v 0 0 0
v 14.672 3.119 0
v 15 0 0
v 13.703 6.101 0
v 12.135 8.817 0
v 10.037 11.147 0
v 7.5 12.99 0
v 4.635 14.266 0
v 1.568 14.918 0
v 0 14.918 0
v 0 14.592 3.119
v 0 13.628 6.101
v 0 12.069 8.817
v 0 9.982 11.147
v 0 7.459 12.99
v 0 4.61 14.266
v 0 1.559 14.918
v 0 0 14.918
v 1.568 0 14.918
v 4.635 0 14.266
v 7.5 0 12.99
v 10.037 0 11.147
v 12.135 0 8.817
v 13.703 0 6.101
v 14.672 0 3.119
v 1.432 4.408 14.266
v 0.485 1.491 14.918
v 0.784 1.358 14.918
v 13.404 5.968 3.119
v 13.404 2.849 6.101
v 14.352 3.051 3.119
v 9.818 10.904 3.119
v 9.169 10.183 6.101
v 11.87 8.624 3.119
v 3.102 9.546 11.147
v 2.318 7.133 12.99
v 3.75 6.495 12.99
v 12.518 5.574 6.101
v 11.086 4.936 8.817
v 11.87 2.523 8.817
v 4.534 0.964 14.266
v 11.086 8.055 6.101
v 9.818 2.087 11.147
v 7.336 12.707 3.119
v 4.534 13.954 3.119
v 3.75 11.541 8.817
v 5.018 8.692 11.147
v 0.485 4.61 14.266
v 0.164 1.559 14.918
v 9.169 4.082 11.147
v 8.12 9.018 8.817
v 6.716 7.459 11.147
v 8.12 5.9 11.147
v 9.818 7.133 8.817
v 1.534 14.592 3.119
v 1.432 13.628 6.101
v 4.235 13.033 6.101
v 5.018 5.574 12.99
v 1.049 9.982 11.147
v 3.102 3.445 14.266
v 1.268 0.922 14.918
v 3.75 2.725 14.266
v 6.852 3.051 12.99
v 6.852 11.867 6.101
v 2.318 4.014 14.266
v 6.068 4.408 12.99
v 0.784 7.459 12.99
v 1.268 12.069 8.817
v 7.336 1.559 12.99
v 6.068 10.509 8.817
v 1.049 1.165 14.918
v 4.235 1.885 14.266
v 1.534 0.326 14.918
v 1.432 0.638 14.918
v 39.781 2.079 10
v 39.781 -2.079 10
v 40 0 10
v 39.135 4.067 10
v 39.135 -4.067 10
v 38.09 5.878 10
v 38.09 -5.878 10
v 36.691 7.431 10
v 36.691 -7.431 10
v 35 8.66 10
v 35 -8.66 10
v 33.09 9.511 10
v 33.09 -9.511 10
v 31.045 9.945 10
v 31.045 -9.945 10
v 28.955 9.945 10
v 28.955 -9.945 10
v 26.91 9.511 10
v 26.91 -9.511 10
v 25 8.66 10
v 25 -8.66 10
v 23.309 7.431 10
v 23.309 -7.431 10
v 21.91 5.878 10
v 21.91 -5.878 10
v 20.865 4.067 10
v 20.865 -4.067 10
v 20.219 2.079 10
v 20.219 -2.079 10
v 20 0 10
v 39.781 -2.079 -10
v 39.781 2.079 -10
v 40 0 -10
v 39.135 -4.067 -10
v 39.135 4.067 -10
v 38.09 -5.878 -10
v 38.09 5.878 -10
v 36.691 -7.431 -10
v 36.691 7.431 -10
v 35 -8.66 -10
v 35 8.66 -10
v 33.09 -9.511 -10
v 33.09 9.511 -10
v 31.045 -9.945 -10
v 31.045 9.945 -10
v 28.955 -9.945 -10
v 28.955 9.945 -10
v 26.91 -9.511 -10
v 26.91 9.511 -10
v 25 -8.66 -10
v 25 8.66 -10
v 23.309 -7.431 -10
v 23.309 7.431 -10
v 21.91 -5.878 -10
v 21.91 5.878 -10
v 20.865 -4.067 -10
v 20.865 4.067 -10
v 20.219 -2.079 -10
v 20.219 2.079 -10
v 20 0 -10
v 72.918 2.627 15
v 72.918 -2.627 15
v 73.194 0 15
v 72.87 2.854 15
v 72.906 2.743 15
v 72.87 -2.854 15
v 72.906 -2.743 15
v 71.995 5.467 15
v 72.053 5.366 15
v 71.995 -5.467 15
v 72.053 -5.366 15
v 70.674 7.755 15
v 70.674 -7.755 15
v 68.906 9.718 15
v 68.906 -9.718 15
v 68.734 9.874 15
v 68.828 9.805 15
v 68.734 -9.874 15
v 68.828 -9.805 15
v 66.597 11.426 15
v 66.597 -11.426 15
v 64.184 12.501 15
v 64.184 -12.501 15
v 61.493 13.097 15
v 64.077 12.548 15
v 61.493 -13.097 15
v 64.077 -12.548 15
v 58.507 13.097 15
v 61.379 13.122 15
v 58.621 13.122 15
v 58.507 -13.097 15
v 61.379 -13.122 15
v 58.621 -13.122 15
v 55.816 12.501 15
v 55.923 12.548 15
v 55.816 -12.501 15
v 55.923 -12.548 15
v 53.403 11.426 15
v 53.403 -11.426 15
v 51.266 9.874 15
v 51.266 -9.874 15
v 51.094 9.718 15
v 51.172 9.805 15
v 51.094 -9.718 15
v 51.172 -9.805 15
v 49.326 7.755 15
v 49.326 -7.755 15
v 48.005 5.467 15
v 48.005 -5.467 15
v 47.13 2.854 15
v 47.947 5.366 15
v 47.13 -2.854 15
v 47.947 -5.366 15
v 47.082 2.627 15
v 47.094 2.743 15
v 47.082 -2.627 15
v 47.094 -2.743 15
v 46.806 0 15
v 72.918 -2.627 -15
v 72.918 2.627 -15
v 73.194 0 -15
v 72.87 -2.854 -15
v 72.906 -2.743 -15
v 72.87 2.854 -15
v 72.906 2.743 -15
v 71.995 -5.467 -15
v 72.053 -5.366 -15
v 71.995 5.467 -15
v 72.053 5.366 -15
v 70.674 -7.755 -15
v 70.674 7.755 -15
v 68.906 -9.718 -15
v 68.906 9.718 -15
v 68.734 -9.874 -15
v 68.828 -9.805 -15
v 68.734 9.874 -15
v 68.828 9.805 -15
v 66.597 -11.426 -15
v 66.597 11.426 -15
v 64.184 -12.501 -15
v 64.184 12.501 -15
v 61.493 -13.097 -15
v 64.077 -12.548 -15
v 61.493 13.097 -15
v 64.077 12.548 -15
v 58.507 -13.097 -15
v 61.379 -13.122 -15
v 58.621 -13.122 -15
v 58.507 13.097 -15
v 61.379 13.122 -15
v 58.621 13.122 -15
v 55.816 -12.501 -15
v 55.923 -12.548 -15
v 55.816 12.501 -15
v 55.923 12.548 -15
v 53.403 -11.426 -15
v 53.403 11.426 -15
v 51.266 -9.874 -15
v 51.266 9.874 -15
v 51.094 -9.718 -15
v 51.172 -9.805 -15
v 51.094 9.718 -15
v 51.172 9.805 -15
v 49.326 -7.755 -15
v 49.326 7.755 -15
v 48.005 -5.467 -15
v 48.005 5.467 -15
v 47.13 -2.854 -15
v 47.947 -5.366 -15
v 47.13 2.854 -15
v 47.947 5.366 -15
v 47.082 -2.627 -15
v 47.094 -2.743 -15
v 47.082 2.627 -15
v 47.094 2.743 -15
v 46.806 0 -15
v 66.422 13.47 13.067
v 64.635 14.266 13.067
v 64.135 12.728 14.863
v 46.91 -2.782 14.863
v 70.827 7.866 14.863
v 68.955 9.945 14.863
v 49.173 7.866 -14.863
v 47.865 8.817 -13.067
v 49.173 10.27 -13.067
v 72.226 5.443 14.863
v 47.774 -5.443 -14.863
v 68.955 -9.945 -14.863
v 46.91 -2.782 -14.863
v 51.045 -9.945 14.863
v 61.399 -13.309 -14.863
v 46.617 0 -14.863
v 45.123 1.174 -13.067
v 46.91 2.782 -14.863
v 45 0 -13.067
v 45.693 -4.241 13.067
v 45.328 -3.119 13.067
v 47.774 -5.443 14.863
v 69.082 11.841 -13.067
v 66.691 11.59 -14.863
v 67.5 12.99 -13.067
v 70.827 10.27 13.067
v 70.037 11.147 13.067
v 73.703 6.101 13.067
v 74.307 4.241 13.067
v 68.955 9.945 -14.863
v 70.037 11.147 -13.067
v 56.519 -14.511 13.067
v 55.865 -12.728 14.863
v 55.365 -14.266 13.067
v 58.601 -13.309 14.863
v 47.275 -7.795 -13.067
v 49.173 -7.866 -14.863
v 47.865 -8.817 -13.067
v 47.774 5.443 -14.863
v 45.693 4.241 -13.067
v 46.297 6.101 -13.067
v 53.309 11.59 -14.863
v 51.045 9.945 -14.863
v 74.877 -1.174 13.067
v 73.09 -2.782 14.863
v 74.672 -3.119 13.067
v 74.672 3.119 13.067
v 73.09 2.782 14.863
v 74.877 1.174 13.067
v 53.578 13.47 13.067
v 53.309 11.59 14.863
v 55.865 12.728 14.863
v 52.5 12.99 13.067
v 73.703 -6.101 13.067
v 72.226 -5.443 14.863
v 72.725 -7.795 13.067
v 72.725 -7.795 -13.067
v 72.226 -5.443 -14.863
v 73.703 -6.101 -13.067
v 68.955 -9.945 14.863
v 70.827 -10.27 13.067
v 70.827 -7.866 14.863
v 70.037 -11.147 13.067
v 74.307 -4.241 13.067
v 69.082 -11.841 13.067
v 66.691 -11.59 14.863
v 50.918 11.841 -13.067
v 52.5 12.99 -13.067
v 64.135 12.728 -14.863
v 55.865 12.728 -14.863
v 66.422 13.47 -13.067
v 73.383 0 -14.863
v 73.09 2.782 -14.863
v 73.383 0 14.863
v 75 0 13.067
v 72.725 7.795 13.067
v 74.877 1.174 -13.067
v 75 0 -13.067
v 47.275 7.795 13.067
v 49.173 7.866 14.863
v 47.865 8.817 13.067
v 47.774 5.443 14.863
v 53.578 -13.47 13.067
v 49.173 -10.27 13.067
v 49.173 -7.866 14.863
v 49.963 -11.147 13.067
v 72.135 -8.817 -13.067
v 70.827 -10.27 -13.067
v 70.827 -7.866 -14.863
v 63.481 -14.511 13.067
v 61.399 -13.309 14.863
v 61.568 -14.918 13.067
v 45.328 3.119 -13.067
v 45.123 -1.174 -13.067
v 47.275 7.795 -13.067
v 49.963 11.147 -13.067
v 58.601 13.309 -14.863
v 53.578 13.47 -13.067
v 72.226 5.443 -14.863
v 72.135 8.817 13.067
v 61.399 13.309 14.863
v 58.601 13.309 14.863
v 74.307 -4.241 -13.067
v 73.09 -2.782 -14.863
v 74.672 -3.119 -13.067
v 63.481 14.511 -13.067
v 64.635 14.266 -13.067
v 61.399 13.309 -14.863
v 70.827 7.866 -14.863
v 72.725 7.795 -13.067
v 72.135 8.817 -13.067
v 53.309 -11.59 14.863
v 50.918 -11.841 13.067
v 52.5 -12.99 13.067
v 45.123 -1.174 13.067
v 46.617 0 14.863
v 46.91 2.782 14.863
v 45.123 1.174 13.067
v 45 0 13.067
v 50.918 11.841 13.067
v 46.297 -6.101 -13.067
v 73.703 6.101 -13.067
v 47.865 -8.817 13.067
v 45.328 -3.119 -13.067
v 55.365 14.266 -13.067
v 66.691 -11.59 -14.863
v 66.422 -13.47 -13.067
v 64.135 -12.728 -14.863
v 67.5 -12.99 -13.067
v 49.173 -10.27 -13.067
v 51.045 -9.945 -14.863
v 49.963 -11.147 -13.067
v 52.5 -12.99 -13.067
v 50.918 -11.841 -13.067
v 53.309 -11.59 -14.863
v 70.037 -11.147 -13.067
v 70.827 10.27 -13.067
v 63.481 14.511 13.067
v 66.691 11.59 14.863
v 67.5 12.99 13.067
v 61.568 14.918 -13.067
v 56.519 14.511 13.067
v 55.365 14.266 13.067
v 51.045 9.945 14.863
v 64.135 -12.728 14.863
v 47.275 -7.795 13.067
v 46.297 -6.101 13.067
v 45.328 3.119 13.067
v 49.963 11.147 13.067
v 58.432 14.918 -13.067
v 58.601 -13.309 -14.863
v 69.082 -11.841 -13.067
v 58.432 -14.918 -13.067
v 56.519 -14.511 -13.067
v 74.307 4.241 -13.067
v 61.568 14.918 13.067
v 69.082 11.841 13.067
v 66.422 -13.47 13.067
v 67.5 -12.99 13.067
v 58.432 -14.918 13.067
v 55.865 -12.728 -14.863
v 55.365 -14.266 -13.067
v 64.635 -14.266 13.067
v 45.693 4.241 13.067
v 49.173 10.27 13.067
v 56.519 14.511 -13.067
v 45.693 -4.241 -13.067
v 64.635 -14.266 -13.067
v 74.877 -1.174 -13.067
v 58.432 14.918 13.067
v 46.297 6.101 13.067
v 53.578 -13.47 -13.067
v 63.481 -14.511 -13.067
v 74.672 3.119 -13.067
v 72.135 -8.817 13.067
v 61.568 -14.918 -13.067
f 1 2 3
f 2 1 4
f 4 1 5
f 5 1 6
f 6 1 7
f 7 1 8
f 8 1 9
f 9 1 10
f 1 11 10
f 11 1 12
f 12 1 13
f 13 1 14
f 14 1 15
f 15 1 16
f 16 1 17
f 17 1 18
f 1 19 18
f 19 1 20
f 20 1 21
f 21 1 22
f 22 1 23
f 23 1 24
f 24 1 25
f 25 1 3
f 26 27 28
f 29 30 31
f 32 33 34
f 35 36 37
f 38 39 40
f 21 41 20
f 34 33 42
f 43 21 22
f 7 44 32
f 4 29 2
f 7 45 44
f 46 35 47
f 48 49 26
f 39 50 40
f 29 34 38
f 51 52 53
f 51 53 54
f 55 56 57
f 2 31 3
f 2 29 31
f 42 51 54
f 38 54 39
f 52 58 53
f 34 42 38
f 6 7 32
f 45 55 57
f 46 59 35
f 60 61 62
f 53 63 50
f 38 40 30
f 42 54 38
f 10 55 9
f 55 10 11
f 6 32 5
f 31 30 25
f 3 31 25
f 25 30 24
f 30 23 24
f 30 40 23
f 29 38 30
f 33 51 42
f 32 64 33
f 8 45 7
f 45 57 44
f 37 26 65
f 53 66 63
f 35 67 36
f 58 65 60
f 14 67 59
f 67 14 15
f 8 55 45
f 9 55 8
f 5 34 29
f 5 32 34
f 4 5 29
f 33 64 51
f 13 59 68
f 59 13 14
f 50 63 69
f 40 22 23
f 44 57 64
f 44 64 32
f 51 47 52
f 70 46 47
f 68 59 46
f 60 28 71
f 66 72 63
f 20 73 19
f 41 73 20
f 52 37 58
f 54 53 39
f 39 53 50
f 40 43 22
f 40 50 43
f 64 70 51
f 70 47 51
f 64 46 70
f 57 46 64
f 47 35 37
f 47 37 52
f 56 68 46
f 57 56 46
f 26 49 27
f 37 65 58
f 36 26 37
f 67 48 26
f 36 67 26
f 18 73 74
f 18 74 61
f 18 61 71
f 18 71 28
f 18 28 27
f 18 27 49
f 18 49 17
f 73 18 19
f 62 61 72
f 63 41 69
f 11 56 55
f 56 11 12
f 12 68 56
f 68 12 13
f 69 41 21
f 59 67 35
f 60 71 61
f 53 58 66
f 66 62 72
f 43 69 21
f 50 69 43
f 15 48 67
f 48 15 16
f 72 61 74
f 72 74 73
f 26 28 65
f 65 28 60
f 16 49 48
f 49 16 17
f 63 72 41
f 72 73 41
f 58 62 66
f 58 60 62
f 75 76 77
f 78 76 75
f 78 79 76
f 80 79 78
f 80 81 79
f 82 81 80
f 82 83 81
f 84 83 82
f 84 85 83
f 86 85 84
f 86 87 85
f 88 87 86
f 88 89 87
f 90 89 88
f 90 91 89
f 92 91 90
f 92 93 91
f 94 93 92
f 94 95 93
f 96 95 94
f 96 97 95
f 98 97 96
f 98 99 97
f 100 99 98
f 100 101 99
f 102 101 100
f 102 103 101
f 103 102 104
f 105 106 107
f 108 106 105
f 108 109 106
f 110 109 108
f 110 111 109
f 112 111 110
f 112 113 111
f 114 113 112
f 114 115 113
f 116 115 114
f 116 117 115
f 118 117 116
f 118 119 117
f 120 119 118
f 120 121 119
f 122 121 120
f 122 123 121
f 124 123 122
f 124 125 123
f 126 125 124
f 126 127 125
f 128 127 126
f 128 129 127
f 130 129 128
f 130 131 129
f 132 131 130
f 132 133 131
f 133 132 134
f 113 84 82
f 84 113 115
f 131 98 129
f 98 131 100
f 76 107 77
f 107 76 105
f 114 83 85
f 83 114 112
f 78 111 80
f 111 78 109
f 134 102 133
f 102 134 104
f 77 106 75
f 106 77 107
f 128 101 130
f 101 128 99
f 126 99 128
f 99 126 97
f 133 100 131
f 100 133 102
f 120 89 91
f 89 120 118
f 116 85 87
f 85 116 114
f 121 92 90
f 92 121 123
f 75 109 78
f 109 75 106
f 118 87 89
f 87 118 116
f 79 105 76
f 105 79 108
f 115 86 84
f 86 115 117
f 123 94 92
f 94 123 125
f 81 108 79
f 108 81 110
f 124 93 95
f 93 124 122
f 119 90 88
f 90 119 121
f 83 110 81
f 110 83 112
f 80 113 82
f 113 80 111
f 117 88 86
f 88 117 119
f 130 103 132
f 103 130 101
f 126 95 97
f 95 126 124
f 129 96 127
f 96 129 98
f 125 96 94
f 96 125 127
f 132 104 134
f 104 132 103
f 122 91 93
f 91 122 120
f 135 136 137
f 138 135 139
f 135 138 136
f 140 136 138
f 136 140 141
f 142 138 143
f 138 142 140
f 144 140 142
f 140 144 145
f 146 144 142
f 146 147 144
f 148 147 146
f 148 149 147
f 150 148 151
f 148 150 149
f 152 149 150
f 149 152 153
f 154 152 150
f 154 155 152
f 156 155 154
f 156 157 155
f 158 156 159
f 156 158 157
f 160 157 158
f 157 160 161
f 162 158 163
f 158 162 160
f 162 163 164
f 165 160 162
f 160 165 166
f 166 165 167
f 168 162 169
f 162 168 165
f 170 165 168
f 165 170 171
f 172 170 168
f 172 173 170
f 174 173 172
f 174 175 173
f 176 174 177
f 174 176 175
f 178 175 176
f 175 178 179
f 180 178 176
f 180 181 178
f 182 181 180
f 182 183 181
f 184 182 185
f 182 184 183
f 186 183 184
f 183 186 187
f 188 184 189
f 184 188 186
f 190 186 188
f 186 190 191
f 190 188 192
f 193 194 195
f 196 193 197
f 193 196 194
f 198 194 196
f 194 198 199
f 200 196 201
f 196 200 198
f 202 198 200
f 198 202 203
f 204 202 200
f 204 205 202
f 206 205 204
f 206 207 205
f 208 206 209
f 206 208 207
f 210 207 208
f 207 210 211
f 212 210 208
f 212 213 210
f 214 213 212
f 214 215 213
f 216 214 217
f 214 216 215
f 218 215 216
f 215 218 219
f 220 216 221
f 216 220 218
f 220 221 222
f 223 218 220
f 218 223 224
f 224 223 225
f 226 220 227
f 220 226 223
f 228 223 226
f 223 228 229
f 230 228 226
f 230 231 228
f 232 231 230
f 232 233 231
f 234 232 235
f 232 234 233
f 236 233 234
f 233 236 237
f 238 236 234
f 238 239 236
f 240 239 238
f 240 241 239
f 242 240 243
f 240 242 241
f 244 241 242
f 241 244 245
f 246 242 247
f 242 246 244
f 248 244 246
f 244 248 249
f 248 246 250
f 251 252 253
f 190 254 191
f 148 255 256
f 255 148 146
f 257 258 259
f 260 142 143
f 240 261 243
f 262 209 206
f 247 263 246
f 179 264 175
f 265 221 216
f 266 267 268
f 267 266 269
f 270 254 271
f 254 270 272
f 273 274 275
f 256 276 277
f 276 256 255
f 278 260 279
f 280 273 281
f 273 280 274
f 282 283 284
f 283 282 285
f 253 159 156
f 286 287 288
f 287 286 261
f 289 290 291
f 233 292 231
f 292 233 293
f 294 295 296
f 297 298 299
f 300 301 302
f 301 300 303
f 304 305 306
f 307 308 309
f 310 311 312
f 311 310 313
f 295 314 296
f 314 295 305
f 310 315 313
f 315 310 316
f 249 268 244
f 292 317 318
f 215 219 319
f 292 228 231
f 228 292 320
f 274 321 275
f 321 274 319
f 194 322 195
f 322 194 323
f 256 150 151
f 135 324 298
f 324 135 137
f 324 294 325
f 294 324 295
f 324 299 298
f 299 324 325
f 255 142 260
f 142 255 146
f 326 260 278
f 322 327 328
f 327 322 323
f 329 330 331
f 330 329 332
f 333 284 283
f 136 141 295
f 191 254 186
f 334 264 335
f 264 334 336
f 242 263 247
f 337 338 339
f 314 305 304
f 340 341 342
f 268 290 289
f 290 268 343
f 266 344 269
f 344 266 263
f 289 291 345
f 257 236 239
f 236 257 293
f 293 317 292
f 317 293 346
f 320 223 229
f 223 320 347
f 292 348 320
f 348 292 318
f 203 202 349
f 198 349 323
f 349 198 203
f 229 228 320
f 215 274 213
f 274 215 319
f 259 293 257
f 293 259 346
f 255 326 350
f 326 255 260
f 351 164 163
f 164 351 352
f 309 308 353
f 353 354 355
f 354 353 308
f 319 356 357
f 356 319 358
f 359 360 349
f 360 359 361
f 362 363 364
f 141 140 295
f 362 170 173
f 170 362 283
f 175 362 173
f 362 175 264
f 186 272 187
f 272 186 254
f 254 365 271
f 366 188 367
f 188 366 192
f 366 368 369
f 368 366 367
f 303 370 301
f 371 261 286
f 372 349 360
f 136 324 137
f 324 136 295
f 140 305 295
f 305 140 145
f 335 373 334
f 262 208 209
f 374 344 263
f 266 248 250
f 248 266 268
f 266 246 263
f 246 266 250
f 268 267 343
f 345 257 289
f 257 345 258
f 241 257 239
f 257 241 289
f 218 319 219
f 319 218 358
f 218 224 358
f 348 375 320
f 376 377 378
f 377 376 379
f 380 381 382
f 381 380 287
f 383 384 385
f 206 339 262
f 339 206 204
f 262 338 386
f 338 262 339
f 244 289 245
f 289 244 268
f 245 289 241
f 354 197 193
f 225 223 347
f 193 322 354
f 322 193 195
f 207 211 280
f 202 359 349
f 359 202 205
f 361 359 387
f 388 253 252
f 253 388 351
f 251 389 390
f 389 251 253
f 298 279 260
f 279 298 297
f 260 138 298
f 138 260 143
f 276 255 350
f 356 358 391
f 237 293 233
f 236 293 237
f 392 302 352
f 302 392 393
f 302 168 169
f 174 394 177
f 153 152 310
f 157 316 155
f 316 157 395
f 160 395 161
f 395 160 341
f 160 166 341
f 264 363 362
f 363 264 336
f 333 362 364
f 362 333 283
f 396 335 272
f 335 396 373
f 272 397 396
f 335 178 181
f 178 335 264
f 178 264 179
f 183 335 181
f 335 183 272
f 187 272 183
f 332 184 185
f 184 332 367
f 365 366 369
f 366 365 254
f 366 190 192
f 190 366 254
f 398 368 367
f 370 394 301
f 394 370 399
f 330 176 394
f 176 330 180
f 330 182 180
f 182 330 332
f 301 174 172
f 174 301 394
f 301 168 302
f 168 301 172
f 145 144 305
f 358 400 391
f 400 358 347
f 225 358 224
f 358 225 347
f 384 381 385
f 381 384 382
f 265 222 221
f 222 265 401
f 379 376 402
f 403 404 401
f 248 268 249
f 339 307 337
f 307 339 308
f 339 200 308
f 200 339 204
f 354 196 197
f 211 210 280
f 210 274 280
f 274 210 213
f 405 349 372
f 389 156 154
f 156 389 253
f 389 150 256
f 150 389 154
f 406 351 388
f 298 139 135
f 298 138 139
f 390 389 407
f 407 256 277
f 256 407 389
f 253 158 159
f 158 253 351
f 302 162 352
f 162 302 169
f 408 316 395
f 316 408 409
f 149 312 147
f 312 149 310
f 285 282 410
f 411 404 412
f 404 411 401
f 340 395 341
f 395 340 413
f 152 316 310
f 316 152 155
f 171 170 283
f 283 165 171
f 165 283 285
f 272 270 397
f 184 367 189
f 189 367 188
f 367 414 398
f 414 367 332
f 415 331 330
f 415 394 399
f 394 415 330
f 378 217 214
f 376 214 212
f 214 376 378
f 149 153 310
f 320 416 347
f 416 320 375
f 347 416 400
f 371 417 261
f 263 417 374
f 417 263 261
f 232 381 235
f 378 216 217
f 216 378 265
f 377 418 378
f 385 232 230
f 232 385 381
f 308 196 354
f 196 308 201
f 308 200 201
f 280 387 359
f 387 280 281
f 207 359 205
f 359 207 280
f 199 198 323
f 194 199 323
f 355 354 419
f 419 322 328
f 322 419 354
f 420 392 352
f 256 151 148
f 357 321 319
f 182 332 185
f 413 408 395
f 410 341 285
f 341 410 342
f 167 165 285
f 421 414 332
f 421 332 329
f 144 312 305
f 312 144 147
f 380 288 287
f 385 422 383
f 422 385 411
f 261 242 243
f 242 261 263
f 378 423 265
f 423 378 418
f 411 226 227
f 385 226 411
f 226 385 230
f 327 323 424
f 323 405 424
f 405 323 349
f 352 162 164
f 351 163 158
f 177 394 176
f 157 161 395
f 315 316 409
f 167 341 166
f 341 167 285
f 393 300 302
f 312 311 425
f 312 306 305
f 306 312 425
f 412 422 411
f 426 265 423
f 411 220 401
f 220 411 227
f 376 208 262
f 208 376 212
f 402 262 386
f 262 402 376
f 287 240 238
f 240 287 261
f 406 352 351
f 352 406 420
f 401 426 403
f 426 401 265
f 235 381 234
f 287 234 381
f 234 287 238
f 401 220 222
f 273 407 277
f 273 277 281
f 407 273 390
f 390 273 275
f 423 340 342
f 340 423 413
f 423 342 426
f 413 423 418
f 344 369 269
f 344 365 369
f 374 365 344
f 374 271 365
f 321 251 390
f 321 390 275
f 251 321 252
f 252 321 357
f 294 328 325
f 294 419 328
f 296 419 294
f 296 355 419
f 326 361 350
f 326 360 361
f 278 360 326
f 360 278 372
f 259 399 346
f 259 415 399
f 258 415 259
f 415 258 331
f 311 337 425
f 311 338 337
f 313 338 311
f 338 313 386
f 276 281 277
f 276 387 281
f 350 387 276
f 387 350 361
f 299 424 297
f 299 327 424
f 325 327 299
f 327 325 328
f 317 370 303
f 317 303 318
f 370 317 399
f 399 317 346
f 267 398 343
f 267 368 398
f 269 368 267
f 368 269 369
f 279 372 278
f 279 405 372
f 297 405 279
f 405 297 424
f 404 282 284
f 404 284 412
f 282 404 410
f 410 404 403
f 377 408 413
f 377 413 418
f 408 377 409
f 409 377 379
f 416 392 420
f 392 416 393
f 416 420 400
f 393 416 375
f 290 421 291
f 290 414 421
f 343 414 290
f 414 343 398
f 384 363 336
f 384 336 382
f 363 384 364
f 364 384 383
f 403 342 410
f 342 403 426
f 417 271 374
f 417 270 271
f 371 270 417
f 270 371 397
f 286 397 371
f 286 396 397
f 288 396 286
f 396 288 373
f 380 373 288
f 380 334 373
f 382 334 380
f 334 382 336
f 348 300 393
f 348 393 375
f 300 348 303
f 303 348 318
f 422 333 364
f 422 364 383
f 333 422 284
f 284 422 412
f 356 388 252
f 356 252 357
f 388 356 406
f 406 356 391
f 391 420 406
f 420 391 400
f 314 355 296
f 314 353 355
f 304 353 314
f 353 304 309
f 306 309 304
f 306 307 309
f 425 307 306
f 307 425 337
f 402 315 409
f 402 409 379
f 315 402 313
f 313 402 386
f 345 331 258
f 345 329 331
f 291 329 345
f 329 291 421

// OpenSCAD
// Intersection operation tests
union() {
    intersection() {
        cube([20, 20, 20]);
        sphere(r=15);
    }
    
    translate([30, 0, 0]) intersection() {
        cube([20, 20, 20], center=true);
        cylinder(h=30, r=10, center=true);
    }
    
    translate([60, 0, 0]) intersection() {
        cube([30, 30, 30], center=true);
        sphere(r=20);
        cylinder(h=40, r=15, center=true);
    }
}
